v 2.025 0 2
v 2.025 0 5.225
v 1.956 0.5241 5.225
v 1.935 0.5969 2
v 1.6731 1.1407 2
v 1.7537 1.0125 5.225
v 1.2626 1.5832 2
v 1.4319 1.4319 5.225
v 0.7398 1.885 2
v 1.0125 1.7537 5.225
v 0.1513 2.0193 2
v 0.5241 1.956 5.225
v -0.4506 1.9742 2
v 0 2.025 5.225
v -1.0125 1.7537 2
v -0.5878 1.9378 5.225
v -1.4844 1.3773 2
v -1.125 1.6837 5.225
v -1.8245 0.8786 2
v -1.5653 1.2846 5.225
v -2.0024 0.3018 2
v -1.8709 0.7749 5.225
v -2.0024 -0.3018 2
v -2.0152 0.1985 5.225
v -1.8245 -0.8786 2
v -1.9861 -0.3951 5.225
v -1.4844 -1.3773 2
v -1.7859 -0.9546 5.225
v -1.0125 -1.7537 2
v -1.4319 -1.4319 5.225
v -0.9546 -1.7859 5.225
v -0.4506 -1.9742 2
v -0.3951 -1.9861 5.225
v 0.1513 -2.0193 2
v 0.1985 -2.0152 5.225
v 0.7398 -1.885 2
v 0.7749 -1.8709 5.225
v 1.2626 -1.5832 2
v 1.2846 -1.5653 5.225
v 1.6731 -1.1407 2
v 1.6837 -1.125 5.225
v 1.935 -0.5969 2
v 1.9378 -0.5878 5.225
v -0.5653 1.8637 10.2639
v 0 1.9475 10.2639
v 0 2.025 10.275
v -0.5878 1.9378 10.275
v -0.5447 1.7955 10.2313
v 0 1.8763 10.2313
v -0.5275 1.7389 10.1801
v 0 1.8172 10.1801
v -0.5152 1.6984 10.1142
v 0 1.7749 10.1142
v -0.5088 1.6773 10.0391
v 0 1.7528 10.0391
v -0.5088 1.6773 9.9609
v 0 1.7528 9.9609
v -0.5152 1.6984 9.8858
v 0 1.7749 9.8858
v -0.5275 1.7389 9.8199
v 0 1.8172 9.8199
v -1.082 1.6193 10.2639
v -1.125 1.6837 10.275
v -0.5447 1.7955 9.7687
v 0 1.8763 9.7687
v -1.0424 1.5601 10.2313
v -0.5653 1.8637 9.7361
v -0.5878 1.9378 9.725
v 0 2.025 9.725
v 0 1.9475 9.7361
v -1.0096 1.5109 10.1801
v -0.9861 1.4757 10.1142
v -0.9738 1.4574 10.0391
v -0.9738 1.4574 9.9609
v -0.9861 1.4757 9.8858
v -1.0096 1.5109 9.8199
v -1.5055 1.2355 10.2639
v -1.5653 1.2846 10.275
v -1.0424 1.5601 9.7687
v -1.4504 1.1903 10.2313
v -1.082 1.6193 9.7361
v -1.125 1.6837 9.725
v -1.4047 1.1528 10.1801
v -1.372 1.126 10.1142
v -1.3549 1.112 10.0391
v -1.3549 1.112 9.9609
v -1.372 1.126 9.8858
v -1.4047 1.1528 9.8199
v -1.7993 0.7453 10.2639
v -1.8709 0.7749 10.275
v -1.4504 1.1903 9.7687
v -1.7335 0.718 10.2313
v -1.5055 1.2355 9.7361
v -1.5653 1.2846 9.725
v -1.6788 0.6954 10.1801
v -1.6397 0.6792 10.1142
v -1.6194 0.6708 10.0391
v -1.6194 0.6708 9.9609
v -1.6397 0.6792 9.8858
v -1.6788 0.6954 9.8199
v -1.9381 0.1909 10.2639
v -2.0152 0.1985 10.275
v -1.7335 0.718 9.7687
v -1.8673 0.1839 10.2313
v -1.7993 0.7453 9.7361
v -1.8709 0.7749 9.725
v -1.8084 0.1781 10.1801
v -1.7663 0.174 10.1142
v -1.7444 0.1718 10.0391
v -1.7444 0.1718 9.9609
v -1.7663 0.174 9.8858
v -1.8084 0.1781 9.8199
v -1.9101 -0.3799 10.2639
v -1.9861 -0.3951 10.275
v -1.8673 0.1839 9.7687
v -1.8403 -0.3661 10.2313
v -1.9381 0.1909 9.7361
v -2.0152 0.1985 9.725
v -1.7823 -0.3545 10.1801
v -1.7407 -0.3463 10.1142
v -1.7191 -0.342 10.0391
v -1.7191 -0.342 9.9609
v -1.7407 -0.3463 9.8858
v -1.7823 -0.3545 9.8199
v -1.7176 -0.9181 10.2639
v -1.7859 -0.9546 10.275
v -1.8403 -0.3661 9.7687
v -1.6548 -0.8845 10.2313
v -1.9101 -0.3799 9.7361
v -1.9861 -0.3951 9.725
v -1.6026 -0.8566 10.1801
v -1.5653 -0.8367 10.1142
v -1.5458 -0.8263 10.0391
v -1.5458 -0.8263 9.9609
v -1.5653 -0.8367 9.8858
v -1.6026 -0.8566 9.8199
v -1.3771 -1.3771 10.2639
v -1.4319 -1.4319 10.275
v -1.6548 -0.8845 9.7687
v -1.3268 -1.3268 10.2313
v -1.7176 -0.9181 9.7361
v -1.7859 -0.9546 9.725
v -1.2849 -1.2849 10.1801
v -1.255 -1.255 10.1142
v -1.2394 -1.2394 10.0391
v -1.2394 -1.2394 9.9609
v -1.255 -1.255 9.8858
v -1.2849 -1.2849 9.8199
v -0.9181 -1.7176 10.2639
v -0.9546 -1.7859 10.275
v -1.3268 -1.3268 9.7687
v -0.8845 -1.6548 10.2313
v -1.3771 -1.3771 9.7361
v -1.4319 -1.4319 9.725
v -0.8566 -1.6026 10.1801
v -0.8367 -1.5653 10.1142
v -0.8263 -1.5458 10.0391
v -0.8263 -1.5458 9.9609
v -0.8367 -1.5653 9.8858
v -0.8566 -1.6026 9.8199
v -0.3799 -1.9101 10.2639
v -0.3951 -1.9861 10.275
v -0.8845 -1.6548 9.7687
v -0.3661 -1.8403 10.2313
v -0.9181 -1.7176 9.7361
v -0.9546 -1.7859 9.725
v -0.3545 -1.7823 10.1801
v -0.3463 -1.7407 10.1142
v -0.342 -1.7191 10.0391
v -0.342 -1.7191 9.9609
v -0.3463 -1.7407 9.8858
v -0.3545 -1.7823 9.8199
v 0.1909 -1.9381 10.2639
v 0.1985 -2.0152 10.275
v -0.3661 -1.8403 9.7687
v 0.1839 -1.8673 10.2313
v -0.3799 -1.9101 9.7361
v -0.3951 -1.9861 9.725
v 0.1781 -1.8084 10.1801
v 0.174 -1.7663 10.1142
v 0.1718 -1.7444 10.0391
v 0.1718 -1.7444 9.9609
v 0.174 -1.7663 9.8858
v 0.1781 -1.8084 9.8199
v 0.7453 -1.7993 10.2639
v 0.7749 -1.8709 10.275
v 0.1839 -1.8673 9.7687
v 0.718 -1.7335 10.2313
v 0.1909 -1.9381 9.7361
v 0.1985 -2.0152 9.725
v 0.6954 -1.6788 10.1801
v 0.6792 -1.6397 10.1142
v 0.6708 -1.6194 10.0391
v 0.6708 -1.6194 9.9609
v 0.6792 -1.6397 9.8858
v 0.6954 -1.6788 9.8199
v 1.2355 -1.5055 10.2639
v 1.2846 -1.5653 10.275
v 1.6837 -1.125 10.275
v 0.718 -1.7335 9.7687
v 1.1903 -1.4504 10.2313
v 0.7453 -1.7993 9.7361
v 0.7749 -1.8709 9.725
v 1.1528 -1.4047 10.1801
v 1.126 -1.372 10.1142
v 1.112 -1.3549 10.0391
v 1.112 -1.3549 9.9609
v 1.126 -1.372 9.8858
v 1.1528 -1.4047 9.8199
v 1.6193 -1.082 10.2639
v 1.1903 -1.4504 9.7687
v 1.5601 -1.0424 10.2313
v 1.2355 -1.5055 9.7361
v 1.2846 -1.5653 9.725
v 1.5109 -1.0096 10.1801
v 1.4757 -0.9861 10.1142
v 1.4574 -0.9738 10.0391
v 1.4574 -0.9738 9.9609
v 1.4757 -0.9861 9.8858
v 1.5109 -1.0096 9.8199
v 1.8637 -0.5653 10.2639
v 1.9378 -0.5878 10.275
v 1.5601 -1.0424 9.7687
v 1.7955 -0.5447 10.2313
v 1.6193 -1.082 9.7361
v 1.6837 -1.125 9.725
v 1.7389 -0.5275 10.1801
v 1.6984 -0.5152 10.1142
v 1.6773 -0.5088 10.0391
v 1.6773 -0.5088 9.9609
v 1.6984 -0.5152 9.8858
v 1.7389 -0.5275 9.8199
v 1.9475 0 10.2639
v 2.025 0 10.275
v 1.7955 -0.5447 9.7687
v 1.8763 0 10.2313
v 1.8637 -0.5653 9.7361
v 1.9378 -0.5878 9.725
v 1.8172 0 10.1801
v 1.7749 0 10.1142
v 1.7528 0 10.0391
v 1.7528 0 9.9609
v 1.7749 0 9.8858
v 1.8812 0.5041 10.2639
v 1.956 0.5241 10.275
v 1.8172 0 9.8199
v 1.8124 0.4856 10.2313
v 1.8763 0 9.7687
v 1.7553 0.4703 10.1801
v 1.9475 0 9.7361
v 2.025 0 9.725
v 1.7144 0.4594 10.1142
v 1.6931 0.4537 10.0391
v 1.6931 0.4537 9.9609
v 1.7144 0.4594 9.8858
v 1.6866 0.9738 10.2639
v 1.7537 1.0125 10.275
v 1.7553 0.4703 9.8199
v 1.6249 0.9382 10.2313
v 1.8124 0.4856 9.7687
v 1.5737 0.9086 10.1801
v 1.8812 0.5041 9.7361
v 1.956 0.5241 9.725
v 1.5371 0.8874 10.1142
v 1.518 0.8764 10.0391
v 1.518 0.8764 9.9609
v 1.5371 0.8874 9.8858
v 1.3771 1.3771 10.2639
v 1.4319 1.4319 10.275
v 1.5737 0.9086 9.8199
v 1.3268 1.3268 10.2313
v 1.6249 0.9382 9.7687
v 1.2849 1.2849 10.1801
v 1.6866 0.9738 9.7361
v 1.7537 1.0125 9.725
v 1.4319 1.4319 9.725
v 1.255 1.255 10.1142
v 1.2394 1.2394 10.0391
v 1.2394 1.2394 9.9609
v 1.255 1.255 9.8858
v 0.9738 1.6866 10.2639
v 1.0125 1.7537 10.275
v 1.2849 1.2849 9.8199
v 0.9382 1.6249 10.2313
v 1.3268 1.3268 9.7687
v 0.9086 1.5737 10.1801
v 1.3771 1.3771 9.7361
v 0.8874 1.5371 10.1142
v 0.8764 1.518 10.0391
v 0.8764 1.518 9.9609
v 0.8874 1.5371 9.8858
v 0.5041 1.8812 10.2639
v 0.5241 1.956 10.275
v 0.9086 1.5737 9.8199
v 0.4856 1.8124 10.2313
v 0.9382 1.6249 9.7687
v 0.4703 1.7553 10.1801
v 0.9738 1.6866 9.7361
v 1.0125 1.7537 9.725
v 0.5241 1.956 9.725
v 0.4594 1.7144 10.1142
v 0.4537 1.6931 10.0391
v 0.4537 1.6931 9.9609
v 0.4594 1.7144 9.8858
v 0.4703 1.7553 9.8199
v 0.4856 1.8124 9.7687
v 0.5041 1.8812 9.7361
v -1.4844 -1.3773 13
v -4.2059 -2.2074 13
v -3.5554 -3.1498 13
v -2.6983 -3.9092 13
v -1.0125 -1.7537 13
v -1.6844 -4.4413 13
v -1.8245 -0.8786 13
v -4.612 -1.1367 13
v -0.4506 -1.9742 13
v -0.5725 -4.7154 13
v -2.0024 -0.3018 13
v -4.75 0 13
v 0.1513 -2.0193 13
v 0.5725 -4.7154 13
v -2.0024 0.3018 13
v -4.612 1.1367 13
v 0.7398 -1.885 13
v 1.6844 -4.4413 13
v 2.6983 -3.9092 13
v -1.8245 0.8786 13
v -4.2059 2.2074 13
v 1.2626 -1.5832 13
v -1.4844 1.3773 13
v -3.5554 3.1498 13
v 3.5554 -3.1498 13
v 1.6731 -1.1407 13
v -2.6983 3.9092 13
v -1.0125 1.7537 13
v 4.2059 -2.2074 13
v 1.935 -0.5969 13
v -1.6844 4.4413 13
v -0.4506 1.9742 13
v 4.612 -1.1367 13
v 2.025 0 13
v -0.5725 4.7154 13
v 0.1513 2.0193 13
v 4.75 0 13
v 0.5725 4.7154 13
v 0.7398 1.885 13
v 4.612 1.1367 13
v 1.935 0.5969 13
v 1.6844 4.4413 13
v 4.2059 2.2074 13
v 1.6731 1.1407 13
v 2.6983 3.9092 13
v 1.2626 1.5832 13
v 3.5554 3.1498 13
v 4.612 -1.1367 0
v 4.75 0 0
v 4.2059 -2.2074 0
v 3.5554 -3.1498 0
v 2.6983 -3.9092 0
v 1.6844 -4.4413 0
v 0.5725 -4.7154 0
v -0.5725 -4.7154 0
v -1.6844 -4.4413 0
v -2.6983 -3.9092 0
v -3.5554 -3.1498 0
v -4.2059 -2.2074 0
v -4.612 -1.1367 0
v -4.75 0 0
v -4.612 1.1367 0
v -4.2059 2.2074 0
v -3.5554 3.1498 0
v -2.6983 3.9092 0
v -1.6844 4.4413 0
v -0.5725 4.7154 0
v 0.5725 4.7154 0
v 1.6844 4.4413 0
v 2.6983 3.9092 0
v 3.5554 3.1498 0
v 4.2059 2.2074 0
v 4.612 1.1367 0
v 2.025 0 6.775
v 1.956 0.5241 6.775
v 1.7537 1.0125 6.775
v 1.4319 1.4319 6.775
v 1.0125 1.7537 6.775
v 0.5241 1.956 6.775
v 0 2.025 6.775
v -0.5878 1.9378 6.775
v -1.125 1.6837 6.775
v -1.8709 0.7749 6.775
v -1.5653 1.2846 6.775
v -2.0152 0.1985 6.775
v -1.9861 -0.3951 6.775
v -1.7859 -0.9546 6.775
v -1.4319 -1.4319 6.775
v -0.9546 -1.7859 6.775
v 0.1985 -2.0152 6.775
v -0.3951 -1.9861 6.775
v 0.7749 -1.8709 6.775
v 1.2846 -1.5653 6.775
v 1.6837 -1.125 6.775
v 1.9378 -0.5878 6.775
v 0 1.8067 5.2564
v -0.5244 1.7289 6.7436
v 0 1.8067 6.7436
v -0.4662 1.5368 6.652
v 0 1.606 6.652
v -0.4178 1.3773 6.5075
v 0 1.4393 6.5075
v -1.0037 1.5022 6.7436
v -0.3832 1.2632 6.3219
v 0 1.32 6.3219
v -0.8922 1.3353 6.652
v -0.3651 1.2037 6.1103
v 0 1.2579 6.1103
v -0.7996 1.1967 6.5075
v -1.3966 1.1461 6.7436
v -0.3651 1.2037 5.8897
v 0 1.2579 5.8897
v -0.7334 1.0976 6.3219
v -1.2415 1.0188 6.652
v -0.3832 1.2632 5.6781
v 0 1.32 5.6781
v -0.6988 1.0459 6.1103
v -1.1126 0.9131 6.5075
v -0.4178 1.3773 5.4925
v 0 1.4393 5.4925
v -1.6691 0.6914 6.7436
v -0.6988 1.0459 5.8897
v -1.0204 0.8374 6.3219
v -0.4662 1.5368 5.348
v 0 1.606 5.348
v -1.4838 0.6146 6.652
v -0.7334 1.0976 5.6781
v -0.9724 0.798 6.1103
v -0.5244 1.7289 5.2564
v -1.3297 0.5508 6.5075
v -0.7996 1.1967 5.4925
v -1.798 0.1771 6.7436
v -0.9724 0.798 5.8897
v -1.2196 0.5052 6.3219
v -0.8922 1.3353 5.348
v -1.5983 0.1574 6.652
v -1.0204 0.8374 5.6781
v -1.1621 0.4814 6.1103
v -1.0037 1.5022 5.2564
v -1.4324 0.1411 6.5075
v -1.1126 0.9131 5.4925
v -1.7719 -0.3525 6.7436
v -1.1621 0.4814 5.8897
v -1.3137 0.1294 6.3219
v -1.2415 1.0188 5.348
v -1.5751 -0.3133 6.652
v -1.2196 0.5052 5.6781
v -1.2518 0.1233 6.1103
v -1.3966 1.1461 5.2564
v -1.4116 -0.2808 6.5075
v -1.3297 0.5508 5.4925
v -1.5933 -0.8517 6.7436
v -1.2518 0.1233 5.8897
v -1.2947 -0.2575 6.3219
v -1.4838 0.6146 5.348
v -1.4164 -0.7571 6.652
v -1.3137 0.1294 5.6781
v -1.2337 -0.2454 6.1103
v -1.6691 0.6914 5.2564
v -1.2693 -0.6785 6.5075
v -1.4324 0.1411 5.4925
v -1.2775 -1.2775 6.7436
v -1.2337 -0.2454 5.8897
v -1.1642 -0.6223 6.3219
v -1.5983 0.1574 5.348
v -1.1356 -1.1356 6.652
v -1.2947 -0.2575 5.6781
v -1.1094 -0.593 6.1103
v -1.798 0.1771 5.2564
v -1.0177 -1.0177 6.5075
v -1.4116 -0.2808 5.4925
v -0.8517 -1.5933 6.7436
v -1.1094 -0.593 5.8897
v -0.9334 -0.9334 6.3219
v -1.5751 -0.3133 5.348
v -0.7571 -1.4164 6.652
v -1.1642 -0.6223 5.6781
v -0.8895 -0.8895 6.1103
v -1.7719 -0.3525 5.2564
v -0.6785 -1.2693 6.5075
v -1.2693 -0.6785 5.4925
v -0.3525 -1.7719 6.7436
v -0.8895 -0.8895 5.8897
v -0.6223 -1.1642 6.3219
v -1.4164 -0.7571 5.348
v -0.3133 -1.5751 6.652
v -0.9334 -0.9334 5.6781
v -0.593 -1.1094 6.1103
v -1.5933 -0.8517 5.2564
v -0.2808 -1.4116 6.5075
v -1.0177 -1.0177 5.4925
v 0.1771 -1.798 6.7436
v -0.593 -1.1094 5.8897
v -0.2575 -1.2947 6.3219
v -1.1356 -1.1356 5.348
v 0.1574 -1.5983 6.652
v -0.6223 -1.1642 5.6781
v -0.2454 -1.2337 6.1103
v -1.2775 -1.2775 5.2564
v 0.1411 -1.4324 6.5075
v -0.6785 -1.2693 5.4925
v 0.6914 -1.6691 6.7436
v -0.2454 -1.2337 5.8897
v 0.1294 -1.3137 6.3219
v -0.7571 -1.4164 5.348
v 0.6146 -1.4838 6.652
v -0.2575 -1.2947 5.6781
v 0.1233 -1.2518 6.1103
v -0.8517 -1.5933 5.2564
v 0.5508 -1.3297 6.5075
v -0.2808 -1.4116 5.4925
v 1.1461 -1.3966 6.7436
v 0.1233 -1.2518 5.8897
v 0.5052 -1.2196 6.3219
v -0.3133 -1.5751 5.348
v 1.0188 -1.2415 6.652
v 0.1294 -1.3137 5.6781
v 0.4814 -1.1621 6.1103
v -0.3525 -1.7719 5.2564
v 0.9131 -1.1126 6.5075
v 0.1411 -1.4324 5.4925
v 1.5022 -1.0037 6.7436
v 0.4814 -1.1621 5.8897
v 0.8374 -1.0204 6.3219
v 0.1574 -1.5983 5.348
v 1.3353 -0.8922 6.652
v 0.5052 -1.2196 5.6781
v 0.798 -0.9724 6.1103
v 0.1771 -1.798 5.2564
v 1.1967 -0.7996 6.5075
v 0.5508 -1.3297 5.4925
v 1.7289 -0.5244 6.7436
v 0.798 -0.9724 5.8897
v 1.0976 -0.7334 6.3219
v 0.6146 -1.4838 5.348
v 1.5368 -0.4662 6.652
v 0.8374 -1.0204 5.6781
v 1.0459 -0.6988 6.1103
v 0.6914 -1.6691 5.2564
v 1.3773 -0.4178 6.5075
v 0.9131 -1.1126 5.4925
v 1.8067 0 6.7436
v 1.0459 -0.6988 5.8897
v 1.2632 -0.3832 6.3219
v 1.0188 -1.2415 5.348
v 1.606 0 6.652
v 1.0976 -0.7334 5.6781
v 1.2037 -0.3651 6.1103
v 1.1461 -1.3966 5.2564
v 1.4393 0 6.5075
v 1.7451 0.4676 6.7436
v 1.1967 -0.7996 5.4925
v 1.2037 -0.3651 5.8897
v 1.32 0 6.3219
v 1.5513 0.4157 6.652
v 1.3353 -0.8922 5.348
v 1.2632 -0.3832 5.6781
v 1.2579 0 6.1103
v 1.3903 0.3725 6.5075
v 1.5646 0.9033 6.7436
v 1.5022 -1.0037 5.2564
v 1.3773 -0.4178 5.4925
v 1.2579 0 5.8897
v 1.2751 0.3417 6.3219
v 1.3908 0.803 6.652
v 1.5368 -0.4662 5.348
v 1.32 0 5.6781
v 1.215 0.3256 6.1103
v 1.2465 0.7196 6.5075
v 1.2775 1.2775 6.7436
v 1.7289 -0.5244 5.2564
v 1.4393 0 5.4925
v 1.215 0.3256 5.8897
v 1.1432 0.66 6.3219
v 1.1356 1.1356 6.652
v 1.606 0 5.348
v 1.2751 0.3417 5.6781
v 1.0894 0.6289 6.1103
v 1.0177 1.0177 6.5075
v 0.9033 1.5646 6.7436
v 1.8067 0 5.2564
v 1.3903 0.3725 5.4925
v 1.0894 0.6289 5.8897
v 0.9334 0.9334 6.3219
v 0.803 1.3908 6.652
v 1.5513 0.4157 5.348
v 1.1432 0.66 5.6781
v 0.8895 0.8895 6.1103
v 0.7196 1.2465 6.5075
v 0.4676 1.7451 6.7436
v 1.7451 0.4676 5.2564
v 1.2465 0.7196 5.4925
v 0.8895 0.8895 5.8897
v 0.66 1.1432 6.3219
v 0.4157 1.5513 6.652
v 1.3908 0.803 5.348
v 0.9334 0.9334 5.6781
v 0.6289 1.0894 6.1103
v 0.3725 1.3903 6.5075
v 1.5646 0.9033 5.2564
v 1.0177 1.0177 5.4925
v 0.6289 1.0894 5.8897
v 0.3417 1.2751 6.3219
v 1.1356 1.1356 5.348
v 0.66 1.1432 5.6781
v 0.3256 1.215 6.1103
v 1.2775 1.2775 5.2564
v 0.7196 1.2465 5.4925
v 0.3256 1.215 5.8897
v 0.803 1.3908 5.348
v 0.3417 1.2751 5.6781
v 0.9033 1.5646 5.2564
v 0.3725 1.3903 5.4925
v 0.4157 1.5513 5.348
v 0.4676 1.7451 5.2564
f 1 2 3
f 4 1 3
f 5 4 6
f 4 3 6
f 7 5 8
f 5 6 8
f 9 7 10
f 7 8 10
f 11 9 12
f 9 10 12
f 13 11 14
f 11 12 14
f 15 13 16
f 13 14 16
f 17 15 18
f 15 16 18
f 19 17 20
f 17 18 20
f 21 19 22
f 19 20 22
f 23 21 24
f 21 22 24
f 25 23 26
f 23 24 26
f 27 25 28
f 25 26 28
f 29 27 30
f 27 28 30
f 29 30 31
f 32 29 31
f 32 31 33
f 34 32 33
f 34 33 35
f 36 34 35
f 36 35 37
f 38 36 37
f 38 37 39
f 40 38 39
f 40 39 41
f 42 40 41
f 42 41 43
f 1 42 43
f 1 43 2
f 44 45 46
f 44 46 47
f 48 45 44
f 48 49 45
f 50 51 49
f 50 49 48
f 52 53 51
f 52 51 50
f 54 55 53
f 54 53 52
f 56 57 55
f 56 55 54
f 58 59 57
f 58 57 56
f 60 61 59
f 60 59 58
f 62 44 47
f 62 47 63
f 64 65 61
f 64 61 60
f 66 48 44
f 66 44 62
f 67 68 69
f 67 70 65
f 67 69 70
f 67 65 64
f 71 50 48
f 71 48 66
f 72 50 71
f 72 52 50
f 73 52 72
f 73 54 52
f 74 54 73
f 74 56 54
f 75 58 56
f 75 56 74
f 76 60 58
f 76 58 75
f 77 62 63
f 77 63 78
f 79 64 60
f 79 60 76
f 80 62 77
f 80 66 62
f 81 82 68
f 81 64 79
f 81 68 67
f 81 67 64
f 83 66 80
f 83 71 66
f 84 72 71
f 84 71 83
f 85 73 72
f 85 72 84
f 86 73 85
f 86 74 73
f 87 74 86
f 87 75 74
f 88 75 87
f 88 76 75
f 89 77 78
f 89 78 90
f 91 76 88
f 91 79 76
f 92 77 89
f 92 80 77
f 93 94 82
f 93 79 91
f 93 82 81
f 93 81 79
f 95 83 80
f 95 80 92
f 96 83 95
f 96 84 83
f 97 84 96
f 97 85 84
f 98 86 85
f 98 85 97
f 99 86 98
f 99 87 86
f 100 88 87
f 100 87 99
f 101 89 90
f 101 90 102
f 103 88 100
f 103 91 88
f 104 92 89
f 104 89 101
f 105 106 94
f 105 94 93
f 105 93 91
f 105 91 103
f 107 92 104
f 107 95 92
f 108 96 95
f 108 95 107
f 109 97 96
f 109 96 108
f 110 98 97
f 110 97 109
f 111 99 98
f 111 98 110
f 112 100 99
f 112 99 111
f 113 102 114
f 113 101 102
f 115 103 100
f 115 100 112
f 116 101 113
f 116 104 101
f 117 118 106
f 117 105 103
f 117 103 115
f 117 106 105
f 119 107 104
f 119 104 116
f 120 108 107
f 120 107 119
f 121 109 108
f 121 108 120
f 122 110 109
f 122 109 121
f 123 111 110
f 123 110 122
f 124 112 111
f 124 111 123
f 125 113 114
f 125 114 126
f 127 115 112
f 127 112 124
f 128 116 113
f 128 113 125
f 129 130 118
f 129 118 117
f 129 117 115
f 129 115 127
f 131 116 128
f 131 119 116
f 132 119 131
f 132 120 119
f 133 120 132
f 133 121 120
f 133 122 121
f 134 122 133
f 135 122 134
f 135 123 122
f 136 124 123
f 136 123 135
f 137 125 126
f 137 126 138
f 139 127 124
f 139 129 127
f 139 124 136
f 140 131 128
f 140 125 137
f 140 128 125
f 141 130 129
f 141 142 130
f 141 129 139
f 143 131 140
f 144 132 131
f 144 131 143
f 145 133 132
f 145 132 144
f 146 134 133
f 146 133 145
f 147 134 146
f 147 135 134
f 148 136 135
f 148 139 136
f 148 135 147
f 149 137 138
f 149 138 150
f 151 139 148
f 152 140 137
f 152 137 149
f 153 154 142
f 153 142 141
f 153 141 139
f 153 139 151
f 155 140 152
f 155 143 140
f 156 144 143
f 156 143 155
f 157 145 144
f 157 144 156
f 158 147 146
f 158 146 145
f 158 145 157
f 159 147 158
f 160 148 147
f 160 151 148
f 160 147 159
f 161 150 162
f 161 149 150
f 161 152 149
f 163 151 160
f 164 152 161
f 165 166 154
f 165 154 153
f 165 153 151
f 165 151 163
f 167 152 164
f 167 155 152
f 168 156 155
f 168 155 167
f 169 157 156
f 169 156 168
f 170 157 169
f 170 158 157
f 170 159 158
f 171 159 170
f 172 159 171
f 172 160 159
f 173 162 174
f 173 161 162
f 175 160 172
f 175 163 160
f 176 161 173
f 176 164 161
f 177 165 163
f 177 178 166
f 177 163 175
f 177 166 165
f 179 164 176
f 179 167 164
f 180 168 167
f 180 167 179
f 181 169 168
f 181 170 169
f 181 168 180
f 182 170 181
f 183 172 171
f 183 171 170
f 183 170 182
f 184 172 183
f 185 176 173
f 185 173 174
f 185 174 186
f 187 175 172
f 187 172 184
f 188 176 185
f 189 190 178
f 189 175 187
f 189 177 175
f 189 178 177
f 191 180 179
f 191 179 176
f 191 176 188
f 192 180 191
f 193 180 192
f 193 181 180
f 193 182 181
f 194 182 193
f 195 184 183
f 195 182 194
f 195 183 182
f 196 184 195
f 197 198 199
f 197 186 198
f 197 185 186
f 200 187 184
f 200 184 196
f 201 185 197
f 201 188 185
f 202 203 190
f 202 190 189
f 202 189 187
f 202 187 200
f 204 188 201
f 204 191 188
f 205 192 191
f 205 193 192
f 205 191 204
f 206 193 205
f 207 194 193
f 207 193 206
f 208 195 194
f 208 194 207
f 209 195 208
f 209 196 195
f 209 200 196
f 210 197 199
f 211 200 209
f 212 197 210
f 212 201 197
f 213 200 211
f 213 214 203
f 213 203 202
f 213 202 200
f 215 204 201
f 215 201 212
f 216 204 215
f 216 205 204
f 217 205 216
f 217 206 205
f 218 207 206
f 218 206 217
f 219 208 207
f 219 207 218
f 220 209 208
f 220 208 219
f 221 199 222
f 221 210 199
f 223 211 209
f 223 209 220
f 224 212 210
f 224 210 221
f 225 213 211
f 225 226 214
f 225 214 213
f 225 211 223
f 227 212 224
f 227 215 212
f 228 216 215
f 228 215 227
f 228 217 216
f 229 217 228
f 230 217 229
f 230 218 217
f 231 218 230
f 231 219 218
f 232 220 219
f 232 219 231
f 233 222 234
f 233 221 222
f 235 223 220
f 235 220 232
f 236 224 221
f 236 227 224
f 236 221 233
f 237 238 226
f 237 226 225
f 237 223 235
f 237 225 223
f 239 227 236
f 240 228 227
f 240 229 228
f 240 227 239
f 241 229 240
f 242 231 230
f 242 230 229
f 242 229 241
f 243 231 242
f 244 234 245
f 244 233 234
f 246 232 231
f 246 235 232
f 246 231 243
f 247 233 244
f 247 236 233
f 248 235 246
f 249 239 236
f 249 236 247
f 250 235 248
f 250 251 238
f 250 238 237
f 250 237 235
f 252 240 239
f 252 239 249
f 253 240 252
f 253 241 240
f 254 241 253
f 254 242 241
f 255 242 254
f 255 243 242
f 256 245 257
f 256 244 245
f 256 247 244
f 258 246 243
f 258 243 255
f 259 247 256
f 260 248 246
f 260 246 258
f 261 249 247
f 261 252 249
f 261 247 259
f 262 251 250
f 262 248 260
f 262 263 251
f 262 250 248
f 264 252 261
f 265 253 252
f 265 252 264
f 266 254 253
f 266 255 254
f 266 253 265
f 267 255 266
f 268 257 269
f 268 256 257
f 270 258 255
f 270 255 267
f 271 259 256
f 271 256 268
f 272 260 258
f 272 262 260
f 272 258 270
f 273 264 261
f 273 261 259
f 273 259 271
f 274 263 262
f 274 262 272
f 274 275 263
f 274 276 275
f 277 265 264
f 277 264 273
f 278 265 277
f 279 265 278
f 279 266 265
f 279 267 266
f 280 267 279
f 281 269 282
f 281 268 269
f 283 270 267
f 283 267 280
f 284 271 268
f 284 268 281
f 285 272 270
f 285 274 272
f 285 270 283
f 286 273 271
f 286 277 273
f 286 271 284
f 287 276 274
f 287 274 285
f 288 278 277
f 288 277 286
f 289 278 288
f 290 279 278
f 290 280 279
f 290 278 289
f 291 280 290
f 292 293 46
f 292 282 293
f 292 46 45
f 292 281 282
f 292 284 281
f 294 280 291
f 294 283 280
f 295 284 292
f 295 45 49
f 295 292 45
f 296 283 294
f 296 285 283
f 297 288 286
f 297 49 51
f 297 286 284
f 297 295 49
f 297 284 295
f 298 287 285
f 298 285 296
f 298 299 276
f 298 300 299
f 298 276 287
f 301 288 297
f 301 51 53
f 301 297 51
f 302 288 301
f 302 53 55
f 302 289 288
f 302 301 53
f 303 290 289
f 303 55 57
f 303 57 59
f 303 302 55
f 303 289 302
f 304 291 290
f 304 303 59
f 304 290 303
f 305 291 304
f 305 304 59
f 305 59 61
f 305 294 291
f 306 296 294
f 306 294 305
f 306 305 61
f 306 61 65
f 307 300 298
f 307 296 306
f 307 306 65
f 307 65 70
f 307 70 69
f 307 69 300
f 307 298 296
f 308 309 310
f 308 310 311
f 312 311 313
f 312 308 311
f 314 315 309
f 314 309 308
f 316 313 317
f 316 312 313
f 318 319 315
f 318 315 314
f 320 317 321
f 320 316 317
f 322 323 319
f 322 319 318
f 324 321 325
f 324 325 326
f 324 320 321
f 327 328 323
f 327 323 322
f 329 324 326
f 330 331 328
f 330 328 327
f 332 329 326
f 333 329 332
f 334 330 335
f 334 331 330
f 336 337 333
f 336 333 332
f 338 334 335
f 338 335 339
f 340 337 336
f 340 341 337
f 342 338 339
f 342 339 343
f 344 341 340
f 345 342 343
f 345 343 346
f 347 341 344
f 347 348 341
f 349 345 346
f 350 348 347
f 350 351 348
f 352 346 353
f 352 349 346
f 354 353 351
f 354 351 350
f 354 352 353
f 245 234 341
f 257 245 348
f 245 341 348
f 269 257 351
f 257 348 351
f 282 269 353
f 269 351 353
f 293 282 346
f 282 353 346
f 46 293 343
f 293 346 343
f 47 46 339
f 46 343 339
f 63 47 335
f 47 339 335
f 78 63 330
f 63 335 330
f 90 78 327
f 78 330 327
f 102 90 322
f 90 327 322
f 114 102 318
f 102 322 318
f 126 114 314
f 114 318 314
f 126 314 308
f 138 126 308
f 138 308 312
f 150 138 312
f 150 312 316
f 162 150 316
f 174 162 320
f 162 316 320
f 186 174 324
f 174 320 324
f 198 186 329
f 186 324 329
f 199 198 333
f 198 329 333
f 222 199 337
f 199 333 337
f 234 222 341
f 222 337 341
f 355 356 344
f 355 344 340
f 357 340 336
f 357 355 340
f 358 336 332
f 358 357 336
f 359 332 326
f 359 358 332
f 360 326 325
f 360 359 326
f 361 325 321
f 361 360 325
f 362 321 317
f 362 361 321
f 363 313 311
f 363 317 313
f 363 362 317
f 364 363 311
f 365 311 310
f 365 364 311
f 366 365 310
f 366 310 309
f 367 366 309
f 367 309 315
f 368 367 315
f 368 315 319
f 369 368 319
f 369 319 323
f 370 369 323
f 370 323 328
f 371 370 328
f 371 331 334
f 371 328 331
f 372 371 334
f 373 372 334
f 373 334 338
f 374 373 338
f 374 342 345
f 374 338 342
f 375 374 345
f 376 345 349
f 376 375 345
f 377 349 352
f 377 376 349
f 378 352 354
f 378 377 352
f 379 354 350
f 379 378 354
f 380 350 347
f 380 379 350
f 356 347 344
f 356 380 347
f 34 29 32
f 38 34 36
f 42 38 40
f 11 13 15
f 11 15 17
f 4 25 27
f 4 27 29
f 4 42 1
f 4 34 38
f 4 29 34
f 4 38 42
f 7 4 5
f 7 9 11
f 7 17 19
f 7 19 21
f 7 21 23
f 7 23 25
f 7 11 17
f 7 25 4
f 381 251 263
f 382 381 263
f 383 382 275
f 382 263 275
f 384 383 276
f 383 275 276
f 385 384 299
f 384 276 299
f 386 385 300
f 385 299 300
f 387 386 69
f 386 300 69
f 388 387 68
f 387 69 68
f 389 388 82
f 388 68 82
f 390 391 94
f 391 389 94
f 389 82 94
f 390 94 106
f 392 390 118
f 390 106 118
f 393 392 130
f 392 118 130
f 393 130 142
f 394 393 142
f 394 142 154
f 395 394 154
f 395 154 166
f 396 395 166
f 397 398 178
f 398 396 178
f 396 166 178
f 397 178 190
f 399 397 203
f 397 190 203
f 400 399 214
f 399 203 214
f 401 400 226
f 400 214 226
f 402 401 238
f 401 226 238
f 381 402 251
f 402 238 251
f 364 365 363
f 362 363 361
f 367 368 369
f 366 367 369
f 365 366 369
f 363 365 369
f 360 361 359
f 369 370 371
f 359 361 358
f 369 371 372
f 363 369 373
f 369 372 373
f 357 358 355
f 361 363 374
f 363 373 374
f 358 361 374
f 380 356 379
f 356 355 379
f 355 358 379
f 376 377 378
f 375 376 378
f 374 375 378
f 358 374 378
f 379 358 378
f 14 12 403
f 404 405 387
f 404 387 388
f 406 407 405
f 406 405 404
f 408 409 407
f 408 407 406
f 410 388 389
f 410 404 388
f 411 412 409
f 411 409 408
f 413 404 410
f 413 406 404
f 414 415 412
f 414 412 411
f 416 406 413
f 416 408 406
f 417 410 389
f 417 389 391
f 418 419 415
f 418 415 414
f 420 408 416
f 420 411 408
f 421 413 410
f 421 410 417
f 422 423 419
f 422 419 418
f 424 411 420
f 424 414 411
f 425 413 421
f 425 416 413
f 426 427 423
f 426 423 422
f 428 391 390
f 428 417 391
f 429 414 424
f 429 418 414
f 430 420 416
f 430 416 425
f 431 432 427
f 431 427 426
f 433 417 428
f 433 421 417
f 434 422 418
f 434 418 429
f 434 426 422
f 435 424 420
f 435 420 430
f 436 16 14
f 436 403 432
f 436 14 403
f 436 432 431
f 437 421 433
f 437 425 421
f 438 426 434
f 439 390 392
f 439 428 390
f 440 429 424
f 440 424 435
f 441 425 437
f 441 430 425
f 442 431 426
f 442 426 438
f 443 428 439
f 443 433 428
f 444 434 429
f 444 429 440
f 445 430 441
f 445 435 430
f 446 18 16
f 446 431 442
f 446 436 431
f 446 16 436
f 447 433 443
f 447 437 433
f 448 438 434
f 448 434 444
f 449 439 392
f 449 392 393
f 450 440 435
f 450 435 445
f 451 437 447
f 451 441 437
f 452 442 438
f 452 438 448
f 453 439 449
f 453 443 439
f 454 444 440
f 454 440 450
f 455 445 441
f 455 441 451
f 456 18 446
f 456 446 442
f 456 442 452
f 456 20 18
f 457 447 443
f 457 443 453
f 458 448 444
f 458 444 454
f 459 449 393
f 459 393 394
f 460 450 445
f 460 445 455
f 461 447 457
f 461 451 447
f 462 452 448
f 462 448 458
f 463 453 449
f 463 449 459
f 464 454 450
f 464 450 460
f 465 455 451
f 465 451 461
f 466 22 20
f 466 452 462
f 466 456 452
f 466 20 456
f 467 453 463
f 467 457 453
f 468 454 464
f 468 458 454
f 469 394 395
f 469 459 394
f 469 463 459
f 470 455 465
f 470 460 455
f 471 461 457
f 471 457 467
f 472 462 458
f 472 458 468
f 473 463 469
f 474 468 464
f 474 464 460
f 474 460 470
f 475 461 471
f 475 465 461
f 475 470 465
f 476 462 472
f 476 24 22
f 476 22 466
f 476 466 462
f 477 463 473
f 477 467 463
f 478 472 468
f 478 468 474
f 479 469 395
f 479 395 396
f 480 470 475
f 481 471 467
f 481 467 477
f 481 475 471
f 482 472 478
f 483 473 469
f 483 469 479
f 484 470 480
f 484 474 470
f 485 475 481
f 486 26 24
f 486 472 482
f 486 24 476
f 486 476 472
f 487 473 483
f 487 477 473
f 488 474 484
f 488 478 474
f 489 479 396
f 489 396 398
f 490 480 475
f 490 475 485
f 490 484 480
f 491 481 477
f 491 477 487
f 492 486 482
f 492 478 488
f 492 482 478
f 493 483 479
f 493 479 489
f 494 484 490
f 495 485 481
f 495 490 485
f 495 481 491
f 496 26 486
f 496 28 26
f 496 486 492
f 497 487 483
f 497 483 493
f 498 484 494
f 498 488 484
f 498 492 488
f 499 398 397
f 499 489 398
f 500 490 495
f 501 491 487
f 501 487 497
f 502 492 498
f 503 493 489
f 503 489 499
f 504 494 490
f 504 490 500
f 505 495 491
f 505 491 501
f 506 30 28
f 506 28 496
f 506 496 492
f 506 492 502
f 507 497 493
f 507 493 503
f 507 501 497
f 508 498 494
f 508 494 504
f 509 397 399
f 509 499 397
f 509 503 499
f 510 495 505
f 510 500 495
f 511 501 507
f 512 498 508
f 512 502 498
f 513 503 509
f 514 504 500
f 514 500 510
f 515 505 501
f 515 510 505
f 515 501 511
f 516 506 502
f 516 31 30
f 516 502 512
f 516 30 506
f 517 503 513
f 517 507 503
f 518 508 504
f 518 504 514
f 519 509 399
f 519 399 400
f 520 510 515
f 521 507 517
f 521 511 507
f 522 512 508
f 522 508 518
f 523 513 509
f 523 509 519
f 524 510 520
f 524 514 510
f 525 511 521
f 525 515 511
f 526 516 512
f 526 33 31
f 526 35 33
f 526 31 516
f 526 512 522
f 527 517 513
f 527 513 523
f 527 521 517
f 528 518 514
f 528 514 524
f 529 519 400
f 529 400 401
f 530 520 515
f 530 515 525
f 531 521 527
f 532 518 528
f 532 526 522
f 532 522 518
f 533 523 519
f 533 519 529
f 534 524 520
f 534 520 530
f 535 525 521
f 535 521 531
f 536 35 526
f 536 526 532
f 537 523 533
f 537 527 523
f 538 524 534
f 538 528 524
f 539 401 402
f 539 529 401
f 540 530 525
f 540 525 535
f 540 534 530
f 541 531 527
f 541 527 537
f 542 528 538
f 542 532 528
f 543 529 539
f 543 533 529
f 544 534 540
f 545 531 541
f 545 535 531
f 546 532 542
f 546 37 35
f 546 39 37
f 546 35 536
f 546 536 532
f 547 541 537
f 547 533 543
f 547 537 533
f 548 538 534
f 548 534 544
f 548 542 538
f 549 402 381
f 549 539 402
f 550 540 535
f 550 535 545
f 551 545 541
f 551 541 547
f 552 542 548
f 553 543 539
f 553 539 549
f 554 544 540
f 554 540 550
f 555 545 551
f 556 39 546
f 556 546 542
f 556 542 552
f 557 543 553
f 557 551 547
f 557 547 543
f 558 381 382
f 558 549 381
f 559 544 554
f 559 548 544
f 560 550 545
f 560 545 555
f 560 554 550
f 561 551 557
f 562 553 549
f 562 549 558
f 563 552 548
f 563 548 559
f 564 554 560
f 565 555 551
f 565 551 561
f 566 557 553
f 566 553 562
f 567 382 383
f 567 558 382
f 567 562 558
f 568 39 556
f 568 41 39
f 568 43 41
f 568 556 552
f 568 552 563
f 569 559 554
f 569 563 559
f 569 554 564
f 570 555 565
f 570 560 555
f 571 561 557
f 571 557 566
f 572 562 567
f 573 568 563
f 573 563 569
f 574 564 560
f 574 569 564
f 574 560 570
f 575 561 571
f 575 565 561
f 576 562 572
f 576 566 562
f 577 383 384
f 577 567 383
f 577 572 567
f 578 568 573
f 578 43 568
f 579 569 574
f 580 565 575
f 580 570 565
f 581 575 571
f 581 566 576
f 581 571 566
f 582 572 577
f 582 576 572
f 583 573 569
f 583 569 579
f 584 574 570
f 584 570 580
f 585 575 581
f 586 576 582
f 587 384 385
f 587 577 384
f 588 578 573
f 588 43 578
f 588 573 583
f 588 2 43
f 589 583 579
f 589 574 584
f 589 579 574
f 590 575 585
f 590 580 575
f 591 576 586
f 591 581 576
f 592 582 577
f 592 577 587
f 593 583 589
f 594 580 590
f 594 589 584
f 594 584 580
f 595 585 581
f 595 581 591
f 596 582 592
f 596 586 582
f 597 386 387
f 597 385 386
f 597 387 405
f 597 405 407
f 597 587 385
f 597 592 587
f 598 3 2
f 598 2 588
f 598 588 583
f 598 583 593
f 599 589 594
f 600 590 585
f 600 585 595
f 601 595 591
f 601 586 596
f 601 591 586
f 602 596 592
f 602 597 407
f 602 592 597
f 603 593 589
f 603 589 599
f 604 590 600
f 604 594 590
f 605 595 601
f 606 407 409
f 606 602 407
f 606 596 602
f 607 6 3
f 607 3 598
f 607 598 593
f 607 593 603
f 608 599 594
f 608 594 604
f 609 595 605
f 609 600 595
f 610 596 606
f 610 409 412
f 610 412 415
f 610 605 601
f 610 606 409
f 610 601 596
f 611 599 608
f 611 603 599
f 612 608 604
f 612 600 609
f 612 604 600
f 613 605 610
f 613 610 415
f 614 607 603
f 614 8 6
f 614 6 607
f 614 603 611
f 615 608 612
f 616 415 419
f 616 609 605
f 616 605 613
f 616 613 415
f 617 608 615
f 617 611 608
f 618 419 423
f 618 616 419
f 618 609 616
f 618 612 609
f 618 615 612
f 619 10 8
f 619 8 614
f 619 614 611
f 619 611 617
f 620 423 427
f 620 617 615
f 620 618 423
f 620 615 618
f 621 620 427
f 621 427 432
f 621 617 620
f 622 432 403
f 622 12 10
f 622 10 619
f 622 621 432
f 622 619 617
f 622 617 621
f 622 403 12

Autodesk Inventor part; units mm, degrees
ref_plane "YZ Plane" through (0, 0, 0) normal (1, 0, 0) x (0, 1, 0)
ref_plane "XZ Plane" through (0, 0, 0) normal (0, 1, 0) x (-1, 0, 0)
ref_plane "XY Plane" through (0, 0, 0) normal (0, 0, 1) x (1, 0, 0)
sketch "Boceto1" plane through (0, 0, 0) normal (0, 0, 1) x (1, 0, 0)
  circle A0 centre (0, 0) radius 4.75
  dimension "d0" = 9.5
extrude "Extrusión1" add sketch "Boceto1" along normal blind 13
sketch "Boceto2" plane through (0, 0, 13) normal (0, 0, 1) x (1, 0, 0)
  circle A0 centre (0, 0) radius 2.025
  dimension "d3" = 4.05
extrude "Extrusión2" cut sketch "Boceto2" against normal blind 11
sketch "Boceto3" plane through (0, 0, 0) normal (1, 0, 0) x (0, 1, 0)
  line L0 (2.025, 13) -> (2.025, 2) projected
  line L1 (2.025, 2) -> (2.025, 6)
  line L2 (1.25, 6) -> (-1.25, 6)
  line L3 (-2.025, 13) -> (-2.025, 2) projected
  line L4 (0, 6) -> (-1.25, 6)
  line L5 (0, 6) -> (1.25, 6)
  arc A0 (2.025, 6.775) -> (2.025, 5.225) centre (2.025, 6) ccw
  arc A1 (-2.025, 5.225) -> (-2.025, 6.775) centre (-2.025, 6) ccw
  line L6 (2.025, 6) -> (2.025, 10)
  line L7 (1.75, 10) -> (-1.75, 10)
  line L8 (0, 10) -> (-1.75, 10)
  line L9 (0, 10) -> (1.75, 10)
  arc A2 (2.025, 10.275) -> (2.025, 9.725) centre (2.025, 10) ccw
  arc A3 (-2.025, 9.725) -> (-2.025, 10.275) centre (-2.025, 10) ccw
  line L10 (-2.025, 2) -> (2.025, 2) projected
  line L11 (0, 2) -> (0, 13)
  line L12 (4.75, 13) -> (-4.75, 13) projected
  point P0 (0, 0)
  point P1 (2.025, 5.225)
  dimension "d7" = 4
  dimension "d8" = 1.25
  dimension "d9" = 1.25
  dimension "d10" = 4
  dimension "d11" = 1.75
  dimension "d12" = 1.75
revolve "Revolución1" add sketch "Boceto3" angle 360 about axis through (0, 0, 2) along (0, 0, 1) contours L0 A2 | A3 L3 | L0 A0 | A1 L3
properties part number "Cilindro_caucho" material "Caucho"
